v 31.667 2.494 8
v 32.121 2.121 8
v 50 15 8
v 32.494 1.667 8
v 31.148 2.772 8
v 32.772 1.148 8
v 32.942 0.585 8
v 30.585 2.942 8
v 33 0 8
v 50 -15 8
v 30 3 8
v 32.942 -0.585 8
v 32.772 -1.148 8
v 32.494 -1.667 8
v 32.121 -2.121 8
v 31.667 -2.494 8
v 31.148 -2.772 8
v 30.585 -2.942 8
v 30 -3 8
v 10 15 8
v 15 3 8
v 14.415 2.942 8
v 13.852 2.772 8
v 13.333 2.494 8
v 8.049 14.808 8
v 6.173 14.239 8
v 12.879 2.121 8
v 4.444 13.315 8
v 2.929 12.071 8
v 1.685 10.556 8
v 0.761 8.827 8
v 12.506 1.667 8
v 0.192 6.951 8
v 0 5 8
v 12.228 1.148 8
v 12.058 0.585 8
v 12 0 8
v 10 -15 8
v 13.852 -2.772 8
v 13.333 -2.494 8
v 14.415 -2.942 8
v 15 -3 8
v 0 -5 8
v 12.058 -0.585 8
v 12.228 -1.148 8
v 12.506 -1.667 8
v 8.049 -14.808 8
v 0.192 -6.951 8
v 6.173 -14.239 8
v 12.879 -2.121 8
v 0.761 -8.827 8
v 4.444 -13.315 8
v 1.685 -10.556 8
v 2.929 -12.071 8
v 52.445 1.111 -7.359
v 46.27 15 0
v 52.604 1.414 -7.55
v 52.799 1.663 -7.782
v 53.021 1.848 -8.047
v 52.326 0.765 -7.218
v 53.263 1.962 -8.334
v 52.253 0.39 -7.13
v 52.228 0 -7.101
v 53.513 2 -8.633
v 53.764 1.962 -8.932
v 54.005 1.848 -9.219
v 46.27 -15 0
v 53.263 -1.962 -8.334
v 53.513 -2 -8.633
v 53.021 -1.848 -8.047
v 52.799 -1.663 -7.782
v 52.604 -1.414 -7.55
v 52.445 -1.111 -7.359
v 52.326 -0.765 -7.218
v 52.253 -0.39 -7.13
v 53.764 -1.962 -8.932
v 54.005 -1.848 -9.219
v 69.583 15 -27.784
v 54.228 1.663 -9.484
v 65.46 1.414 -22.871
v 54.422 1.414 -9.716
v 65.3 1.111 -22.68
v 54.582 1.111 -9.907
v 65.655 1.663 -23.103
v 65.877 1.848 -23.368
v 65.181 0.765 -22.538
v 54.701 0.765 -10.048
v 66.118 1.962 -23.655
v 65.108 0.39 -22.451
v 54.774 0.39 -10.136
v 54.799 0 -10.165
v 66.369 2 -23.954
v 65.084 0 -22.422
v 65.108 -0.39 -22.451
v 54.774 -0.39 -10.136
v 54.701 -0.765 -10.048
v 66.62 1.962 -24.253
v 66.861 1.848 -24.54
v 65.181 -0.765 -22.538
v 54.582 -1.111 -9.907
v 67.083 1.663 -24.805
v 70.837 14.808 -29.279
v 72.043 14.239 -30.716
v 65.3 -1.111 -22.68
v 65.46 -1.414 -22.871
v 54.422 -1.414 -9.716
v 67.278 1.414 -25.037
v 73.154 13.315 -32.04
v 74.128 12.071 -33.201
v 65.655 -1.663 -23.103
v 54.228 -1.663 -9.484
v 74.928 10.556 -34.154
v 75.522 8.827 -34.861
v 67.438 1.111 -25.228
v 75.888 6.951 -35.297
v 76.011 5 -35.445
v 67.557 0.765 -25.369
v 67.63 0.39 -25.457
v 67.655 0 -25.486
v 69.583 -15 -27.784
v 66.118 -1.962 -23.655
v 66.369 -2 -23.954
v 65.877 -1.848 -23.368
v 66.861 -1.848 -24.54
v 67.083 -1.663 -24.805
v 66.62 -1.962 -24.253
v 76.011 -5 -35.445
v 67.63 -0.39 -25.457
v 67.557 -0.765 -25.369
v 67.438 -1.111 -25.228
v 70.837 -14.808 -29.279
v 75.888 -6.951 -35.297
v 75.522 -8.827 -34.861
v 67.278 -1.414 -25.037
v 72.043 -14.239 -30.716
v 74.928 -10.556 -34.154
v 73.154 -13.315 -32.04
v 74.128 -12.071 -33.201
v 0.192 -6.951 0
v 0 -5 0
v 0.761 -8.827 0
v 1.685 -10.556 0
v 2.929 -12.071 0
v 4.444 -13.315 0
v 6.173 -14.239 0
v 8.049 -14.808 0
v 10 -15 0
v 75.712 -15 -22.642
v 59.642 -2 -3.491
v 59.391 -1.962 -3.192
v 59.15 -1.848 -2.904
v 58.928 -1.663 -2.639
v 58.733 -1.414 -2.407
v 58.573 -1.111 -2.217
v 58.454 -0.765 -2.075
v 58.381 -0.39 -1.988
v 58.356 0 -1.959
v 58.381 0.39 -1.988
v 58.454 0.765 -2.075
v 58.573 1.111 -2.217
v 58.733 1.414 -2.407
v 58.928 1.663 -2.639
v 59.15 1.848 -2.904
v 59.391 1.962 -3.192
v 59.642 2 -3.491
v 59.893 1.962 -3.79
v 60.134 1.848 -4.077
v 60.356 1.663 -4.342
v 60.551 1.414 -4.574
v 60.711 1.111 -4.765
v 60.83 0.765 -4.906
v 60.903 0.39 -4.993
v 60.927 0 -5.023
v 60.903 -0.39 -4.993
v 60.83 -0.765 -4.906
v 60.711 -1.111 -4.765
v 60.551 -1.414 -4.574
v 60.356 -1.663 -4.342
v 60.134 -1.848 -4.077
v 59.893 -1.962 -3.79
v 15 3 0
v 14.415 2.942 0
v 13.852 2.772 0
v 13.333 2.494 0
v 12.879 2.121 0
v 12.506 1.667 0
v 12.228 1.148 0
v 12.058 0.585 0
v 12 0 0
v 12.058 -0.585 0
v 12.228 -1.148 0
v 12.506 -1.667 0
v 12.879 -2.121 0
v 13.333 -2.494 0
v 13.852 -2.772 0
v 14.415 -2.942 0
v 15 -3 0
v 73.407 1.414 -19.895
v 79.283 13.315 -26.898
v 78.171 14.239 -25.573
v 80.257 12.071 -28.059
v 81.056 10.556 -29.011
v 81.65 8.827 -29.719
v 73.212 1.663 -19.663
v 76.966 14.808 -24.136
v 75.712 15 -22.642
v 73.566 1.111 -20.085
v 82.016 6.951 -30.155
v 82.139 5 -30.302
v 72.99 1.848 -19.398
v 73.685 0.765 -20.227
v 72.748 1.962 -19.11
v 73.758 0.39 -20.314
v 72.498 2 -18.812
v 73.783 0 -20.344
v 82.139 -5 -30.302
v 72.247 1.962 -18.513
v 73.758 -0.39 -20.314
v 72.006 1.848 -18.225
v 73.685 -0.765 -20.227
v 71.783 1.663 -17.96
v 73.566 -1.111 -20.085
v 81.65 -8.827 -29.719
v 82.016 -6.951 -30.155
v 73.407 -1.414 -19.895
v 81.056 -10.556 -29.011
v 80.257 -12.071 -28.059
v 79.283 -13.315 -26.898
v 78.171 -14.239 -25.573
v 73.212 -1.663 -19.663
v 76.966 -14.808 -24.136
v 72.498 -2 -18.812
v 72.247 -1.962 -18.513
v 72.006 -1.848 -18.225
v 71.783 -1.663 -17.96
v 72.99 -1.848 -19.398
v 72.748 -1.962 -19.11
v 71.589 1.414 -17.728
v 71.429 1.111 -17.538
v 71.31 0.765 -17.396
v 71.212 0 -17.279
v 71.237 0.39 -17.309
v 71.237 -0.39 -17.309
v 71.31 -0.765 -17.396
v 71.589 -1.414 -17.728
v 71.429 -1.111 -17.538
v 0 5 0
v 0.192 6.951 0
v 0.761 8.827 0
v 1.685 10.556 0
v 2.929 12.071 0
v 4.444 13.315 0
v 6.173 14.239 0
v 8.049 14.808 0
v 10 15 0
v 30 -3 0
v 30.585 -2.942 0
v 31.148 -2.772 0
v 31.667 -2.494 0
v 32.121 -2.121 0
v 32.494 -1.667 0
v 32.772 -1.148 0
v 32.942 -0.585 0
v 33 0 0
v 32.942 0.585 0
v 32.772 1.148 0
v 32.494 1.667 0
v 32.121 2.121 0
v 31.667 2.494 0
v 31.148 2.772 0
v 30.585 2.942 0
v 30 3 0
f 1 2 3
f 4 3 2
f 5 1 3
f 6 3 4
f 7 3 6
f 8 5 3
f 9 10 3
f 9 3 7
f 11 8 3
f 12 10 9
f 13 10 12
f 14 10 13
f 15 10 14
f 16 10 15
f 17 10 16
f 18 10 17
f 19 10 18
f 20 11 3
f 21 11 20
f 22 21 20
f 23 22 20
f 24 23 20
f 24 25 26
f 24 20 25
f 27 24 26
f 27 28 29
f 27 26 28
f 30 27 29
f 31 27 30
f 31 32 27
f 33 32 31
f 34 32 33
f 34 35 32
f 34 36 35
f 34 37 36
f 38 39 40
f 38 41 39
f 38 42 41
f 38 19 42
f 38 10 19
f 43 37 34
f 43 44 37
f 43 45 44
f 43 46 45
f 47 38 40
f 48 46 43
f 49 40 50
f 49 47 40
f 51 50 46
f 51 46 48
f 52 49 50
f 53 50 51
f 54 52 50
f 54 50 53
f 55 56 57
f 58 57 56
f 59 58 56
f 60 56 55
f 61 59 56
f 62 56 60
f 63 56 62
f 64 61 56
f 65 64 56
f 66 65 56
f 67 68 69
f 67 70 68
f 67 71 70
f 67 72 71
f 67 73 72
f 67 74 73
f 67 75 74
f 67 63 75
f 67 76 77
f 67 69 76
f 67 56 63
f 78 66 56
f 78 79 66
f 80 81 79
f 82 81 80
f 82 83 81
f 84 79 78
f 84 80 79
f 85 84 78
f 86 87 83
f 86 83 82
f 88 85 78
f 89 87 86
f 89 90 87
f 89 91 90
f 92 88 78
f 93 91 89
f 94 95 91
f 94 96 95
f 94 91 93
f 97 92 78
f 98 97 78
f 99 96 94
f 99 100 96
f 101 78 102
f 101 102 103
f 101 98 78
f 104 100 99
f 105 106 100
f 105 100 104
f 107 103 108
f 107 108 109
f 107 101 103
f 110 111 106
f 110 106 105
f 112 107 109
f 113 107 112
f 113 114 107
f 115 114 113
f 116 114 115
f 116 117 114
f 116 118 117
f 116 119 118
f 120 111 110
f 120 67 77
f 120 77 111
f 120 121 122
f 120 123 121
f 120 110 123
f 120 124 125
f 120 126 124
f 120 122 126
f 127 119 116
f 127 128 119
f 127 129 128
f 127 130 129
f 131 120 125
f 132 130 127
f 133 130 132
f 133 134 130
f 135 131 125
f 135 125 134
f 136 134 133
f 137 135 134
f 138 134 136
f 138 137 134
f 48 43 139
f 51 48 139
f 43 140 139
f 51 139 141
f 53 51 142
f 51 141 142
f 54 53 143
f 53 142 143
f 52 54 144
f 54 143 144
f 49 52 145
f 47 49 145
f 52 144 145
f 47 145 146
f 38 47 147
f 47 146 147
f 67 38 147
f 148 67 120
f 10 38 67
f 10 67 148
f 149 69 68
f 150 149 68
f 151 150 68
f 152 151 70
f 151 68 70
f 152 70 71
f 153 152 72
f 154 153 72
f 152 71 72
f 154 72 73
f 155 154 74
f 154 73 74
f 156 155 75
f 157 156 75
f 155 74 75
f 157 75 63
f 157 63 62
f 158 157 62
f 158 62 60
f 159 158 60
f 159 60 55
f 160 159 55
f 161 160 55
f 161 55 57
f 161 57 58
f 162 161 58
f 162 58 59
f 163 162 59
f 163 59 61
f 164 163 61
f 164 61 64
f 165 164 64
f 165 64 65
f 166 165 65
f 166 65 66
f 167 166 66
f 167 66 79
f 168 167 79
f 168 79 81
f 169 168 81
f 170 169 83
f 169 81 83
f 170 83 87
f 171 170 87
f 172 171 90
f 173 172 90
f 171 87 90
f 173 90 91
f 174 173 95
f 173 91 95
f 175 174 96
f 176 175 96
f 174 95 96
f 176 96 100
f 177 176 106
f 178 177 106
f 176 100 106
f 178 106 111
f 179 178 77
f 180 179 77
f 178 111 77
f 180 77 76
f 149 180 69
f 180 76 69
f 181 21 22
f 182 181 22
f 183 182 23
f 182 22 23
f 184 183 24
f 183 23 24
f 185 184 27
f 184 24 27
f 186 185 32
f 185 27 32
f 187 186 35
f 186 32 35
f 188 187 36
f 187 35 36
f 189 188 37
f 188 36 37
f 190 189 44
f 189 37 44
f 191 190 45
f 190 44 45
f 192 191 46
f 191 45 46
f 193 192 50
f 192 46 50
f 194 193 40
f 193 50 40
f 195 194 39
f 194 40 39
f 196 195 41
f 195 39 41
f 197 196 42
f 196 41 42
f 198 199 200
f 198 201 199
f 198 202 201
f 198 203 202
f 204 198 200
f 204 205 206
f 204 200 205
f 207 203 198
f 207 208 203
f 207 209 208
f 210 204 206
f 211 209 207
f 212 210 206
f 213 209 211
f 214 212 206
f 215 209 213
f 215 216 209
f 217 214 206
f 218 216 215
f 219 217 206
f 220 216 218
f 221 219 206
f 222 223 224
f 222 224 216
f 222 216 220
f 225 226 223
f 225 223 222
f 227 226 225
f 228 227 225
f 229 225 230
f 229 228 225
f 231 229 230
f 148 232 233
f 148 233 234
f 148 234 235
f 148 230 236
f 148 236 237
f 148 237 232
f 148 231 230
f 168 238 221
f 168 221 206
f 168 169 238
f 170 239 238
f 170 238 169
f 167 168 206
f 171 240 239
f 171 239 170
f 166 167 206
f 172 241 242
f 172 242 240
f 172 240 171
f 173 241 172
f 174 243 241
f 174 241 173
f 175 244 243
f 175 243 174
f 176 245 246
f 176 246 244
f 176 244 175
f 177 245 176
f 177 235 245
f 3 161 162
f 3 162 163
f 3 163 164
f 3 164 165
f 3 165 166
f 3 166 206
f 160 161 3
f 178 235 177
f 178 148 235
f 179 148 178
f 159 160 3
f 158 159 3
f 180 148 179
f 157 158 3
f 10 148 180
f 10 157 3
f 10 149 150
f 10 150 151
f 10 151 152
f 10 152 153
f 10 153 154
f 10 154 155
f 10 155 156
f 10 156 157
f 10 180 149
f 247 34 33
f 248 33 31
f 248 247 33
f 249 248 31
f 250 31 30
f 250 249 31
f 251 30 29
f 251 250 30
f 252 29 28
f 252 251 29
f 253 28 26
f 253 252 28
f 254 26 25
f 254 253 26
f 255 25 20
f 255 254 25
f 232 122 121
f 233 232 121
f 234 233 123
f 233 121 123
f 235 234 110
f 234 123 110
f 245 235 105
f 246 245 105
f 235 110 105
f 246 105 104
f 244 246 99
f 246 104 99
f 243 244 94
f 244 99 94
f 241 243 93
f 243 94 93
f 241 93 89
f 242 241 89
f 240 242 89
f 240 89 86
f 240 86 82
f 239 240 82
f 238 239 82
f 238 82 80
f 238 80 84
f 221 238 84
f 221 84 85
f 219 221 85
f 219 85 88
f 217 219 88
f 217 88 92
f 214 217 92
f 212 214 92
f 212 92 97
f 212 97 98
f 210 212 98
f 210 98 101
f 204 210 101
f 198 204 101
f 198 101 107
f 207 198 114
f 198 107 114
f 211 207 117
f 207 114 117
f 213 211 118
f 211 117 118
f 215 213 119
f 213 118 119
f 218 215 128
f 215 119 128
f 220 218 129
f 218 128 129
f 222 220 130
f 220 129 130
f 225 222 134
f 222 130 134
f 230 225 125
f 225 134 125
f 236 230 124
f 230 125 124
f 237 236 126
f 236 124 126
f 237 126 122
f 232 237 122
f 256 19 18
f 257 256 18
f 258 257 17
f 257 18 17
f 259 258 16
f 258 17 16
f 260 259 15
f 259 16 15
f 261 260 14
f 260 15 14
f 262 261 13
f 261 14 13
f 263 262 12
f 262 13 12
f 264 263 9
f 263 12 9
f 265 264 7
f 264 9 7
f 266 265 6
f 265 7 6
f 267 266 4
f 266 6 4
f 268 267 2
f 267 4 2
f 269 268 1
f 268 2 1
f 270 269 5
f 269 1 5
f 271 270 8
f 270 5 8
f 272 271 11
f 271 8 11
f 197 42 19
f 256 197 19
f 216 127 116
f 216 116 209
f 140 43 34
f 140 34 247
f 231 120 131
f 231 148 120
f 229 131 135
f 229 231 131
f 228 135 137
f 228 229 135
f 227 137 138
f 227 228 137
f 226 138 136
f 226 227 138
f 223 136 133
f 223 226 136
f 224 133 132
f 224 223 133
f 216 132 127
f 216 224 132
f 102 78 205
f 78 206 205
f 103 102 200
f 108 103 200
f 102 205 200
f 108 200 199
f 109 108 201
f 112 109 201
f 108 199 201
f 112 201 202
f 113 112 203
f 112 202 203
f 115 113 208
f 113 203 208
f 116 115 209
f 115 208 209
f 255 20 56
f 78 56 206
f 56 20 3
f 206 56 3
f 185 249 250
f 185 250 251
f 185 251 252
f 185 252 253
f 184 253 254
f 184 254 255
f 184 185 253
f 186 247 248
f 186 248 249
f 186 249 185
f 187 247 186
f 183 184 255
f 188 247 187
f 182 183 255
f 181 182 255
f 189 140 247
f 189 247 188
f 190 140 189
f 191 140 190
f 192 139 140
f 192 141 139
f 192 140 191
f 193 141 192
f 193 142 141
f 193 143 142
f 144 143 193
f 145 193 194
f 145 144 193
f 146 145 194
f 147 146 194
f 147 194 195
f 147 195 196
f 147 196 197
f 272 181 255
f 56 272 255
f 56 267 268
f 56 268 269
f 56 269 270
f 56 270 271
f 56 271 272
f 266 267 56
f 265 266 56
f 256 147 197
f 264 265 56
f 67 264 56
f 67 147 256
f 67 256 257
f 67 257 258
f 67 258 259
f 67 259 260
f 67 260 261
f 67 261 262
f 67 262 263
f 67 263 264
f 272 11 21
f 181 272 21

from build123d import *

# Parameters (mm, degrees)
F1_DEPTH = 15
F3_DEPTH = 43.4455230334
F5_D     = 4
F6_R     = 10


with BuildPart() as f1:
    # F0 (on Front) → F1 (new body, symmetric)
    with BuildSketch(Plane.XZ):
        Polygon((0, 8), (0, 0), (46.2695387348, 0), (76.0110249394, -35.4445230334), (82.1393804843, -30.3022221559), (50, 8), align=None)
    extrude(amount=F1_DEPTH, both=True)

    # F2 (on face) → F3 (cut, through all)
    with BuildSketch(Plane.XY.offset(8)):
        with BuildLine():
            ThreePointArc((15, 3), (12, 0), (15, -3))
            Line((15, -3), (30, -3))
            ThreePointArc((30, -3), (33, 0), (30, 3))
            Line((30, 3), (15, 3))
        make_face()
    extrude(amount=-F3_DEPTH, mode=Mode.SUBTRACT)

    # F5 (through all)
    with Locations(Plane(origin=(33.2804354537, 0, 27.9256011146), x_dir=(0, 1, 0), z_dir=(0.7660444431, 0, 0.6427876097))):
        with Locations((0, -41.0110249394), (0, -61.0110249394)):
            Hole(F5_D / 2)

    # F6
    f6_edges = [f1.edges().sort_by_distance(p)[0] for p in [
        (79.075203, -15, -32.873373),
        (79.075203, 15, -32.873373),
        (0, -15, 4),
        (0, 15, 4),
    ]]
    fillet(f6_edges, radius=F6_R)


solid = f1.part
